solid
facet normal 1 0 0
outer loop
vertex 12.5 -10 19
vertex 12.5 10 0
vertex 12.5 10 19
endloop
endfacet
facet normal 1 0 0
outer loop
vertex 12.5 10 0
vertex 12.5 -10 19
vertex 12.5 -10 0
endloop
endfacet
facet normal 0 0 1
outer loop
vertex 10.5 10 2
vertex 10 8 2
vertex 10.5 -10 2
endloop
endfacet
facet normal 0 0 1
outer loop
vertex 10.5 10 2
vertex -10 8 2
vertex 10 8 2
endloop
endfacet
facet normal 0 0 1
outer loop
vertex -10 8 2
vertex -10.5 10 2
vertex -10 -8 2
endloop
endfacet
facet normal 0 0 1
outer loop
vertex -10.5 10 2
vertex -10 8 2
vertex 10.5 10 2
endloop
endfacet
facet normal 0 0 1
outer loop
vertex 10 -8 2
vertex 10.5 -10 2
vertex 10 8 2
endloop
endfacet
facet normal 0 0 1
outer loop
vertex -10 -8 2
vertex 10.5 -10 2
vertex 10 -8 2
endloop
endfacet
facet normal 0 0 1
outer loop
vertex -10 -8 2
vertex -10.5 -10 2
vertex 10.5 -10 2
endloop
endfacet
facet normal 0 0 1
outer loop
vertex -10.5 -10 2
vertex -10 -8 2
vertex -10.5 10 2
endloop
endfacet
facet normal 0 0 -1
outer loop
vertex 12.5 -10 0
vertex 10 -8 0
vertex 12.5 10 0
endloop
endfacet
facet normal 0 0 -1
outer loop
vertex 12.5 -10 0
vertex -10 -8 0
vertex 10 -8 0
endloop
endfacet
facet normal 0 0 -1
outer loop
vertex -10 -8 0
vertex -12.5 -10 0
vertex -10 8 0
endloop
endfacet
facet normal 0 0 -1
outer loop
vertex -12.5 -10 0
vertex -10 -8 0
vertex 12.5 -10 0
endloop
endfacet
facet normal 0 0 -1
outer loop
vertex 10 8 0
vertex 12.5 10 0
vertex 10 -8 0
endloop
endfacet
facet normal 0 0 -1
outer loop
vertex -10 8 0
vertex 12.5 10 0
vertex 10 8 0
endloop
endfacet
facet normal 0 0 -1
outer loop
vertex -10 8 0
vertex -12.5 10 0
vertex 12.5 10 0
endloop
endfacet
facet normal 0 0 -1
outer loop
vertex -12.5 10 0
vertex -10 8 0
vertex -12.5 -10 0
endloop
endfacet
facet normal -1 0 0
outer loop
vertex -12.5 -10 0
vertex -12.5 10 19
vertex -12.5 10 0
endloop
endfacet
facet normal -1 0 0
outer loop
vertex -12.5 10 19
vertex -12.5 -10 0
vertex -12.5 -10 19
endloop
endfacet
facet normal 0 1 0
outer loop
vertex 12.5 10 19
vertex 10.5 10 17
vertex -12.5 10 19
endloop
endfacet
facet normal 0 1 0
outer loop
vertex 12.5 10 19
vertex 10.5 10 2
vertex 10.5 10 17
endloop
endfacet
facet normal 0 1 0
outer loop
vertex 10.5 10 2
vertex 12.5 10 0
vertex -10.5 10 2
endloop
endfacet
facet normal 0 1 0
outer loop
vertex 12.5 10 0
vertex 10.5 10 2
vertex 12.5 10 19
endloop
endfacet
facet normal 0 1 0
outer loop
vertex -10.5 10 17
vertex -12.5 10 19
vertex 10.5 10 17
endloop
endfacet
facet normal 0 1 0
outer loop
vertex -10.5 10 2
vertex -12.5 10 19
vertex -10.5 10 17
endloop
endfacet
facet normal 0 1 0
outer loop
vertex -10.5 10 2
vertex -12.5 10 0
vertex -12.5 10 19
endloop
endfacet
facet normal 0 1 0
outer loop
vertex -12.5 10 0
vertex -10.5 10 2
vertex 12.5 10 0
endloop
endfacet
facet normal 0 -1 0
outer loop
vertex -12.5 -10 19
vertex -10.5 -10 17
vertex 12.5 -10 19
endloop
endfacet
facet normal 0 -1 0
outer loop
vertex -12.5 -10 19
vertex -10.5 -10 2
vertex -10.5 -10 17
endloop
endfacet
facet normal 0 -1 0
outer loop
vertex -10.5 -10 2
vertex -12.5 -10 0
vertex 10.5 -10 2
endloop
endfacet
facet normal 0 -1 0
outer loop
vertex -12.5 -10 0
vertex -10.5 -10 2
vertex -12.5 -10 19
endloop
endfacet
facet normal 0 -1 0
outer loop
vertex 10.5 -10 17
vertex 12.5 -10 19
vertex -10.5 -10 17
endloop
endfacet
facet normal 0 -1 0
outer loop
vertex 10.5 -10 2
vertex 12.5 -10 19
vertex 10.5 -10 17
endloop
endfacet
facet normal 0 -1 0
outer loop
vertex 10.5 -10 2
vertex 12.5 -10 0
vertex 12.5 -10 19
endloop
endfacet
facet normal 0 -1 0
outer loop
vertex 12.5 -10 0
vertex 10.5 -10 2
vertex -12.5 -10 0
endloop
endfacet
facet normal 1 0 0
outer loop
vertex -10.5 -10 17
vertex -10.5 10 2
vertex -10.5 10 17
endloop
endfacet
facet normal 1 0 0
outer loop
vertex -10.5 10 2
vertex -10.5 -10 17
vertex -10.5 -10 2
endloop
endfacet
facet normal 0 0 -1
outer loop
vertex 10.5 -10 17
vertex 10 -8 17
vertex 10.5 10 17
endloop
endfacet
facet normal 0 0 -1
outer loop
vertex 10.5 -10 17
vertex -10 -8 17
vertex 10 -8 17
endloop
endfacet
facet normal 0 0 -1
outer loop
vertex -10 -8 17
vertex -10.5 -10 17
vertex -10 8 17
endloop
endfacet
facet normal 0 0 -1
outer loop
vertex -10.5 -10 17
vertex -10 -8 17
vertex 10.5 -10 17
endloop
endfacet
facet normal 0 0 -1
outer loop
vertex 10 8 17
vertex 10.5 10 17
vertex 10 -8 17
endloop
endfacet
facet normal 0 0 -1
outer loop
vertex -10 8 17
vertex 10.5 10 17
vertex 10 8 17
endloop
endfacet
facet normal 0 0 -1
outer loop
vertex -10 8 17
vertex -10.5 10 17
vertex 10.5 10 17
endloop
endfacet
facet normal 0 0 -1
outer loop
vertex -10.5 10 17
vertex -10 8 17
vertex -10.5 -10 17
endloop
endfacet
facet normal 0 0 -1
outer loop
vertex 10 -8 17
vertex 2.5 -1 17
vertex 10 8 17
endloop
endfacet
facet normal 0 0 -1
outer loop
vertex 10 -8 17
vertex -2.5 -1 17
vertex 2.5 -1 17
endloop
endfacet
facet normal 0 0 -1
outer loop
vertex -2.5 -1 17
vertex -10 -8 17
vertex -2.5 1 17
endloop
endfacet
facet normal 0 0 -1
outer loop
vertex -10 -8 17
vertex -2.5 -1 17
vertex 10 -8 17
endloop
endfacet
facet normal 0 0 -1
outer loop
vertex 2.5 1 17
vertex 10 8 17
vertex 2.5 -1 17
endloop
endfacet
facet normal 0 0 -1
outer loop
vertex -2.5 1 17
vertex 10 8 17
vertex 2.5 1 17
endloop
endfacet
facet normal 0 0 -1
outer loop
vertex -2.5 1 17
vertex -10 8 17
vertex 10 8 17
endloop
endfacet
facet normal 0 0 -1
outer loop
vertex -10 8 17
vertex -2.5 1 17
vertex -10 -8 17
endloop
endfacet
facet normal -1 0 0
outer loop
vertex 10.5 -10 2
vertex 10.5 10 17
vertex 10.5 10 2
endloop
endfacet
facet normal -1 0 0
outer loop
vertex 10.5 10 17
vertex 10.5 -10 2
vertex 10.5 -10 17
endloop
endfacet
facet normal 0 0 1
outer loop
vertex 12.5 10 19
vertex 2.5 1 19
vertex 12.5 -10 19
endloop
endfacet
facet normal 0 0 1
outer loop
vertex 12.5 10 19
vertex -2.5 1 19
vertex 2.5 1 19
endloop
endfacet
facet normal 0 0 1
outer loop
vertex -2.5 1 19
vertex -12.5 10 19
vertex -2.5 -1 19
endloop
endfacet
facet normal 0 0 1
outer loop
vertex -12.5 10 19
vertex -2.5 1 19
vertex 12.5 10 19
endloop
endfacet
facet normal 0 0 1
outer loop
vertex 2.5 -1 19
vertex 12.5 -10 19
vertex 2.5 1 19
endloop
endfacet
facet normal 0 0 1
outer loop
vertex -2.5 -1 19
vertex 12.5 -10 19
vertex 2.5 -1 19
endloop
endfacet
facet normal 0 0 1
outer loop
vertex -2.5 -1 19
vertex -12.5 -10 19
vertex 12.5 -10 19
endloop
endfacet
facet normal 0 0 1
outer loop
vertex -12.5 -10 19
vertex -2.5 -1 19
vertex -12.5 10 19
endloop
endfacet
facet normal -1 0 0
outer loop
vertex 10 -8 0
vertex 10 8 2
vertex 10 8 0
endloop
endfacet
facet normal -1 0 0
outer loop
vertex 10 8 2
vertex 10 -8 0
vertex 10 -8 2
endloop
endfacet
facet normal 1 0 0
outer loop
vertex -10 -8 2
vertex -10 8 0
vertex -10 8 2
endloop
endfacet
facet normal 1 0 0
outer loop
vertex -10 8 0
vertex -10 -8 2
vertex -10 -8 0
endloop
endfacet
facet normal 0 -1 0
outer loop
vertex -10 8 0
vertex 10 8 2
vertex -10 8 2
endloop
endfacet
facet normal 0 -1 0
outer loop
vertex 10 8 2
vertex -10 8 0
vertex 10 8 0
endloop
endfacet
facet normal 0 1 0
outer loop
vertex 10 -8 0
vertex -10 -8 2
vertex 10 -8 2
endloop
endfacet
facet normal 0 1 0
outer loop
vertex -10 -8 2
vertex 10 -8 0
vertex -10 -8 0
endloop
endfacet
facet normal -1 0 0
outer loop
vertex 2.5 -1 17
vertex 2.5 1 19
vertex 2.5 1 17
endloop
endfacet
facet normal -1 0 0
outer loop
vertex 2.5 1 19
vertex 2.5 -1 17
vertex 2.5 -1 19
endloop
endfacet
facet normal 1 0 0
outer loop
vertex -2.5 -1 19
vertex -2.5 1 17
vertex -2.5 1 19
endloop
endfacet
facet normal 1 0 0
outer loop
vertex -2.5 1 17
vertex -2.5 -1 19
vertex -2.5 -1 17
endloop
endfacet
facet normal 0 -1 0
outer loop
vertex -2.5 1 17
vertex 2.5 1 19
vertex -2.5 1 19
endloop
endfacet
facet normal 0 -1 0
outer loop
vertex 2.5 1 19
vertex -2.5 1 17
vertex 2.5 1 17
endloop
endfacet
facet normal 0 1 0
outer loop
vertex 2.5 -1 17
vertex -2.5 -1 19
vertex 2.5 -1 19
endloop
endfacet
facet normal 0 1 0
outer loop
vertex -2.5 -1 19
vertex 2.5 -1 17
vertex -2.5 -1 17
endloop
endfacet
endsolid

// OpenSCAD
module servo_bracket() {
    difference() {
        // Main body of the bracket
        union() {
            // Base plate
            translate([-12.5, -10, 0])
                cube([25, 20, 2]);

            // Side walls
            translate([-12.5, -10, 2])
                cube([2, 20, 15]);
            translate([10.5, -10, 2])
                cube([2, 20, 15]);

            // Top plate
            translate([-12.5, -10, 17])
                cube([25, 20, 2]);
        }

        // Servo slot
        translate([-10, -8, 0])
            cube([20, 16, 17]);

        // Horn slot
        translate([-2.5, -1, 17])
            cube([5, 2, 2]);
    }
}

servo_bracket();
